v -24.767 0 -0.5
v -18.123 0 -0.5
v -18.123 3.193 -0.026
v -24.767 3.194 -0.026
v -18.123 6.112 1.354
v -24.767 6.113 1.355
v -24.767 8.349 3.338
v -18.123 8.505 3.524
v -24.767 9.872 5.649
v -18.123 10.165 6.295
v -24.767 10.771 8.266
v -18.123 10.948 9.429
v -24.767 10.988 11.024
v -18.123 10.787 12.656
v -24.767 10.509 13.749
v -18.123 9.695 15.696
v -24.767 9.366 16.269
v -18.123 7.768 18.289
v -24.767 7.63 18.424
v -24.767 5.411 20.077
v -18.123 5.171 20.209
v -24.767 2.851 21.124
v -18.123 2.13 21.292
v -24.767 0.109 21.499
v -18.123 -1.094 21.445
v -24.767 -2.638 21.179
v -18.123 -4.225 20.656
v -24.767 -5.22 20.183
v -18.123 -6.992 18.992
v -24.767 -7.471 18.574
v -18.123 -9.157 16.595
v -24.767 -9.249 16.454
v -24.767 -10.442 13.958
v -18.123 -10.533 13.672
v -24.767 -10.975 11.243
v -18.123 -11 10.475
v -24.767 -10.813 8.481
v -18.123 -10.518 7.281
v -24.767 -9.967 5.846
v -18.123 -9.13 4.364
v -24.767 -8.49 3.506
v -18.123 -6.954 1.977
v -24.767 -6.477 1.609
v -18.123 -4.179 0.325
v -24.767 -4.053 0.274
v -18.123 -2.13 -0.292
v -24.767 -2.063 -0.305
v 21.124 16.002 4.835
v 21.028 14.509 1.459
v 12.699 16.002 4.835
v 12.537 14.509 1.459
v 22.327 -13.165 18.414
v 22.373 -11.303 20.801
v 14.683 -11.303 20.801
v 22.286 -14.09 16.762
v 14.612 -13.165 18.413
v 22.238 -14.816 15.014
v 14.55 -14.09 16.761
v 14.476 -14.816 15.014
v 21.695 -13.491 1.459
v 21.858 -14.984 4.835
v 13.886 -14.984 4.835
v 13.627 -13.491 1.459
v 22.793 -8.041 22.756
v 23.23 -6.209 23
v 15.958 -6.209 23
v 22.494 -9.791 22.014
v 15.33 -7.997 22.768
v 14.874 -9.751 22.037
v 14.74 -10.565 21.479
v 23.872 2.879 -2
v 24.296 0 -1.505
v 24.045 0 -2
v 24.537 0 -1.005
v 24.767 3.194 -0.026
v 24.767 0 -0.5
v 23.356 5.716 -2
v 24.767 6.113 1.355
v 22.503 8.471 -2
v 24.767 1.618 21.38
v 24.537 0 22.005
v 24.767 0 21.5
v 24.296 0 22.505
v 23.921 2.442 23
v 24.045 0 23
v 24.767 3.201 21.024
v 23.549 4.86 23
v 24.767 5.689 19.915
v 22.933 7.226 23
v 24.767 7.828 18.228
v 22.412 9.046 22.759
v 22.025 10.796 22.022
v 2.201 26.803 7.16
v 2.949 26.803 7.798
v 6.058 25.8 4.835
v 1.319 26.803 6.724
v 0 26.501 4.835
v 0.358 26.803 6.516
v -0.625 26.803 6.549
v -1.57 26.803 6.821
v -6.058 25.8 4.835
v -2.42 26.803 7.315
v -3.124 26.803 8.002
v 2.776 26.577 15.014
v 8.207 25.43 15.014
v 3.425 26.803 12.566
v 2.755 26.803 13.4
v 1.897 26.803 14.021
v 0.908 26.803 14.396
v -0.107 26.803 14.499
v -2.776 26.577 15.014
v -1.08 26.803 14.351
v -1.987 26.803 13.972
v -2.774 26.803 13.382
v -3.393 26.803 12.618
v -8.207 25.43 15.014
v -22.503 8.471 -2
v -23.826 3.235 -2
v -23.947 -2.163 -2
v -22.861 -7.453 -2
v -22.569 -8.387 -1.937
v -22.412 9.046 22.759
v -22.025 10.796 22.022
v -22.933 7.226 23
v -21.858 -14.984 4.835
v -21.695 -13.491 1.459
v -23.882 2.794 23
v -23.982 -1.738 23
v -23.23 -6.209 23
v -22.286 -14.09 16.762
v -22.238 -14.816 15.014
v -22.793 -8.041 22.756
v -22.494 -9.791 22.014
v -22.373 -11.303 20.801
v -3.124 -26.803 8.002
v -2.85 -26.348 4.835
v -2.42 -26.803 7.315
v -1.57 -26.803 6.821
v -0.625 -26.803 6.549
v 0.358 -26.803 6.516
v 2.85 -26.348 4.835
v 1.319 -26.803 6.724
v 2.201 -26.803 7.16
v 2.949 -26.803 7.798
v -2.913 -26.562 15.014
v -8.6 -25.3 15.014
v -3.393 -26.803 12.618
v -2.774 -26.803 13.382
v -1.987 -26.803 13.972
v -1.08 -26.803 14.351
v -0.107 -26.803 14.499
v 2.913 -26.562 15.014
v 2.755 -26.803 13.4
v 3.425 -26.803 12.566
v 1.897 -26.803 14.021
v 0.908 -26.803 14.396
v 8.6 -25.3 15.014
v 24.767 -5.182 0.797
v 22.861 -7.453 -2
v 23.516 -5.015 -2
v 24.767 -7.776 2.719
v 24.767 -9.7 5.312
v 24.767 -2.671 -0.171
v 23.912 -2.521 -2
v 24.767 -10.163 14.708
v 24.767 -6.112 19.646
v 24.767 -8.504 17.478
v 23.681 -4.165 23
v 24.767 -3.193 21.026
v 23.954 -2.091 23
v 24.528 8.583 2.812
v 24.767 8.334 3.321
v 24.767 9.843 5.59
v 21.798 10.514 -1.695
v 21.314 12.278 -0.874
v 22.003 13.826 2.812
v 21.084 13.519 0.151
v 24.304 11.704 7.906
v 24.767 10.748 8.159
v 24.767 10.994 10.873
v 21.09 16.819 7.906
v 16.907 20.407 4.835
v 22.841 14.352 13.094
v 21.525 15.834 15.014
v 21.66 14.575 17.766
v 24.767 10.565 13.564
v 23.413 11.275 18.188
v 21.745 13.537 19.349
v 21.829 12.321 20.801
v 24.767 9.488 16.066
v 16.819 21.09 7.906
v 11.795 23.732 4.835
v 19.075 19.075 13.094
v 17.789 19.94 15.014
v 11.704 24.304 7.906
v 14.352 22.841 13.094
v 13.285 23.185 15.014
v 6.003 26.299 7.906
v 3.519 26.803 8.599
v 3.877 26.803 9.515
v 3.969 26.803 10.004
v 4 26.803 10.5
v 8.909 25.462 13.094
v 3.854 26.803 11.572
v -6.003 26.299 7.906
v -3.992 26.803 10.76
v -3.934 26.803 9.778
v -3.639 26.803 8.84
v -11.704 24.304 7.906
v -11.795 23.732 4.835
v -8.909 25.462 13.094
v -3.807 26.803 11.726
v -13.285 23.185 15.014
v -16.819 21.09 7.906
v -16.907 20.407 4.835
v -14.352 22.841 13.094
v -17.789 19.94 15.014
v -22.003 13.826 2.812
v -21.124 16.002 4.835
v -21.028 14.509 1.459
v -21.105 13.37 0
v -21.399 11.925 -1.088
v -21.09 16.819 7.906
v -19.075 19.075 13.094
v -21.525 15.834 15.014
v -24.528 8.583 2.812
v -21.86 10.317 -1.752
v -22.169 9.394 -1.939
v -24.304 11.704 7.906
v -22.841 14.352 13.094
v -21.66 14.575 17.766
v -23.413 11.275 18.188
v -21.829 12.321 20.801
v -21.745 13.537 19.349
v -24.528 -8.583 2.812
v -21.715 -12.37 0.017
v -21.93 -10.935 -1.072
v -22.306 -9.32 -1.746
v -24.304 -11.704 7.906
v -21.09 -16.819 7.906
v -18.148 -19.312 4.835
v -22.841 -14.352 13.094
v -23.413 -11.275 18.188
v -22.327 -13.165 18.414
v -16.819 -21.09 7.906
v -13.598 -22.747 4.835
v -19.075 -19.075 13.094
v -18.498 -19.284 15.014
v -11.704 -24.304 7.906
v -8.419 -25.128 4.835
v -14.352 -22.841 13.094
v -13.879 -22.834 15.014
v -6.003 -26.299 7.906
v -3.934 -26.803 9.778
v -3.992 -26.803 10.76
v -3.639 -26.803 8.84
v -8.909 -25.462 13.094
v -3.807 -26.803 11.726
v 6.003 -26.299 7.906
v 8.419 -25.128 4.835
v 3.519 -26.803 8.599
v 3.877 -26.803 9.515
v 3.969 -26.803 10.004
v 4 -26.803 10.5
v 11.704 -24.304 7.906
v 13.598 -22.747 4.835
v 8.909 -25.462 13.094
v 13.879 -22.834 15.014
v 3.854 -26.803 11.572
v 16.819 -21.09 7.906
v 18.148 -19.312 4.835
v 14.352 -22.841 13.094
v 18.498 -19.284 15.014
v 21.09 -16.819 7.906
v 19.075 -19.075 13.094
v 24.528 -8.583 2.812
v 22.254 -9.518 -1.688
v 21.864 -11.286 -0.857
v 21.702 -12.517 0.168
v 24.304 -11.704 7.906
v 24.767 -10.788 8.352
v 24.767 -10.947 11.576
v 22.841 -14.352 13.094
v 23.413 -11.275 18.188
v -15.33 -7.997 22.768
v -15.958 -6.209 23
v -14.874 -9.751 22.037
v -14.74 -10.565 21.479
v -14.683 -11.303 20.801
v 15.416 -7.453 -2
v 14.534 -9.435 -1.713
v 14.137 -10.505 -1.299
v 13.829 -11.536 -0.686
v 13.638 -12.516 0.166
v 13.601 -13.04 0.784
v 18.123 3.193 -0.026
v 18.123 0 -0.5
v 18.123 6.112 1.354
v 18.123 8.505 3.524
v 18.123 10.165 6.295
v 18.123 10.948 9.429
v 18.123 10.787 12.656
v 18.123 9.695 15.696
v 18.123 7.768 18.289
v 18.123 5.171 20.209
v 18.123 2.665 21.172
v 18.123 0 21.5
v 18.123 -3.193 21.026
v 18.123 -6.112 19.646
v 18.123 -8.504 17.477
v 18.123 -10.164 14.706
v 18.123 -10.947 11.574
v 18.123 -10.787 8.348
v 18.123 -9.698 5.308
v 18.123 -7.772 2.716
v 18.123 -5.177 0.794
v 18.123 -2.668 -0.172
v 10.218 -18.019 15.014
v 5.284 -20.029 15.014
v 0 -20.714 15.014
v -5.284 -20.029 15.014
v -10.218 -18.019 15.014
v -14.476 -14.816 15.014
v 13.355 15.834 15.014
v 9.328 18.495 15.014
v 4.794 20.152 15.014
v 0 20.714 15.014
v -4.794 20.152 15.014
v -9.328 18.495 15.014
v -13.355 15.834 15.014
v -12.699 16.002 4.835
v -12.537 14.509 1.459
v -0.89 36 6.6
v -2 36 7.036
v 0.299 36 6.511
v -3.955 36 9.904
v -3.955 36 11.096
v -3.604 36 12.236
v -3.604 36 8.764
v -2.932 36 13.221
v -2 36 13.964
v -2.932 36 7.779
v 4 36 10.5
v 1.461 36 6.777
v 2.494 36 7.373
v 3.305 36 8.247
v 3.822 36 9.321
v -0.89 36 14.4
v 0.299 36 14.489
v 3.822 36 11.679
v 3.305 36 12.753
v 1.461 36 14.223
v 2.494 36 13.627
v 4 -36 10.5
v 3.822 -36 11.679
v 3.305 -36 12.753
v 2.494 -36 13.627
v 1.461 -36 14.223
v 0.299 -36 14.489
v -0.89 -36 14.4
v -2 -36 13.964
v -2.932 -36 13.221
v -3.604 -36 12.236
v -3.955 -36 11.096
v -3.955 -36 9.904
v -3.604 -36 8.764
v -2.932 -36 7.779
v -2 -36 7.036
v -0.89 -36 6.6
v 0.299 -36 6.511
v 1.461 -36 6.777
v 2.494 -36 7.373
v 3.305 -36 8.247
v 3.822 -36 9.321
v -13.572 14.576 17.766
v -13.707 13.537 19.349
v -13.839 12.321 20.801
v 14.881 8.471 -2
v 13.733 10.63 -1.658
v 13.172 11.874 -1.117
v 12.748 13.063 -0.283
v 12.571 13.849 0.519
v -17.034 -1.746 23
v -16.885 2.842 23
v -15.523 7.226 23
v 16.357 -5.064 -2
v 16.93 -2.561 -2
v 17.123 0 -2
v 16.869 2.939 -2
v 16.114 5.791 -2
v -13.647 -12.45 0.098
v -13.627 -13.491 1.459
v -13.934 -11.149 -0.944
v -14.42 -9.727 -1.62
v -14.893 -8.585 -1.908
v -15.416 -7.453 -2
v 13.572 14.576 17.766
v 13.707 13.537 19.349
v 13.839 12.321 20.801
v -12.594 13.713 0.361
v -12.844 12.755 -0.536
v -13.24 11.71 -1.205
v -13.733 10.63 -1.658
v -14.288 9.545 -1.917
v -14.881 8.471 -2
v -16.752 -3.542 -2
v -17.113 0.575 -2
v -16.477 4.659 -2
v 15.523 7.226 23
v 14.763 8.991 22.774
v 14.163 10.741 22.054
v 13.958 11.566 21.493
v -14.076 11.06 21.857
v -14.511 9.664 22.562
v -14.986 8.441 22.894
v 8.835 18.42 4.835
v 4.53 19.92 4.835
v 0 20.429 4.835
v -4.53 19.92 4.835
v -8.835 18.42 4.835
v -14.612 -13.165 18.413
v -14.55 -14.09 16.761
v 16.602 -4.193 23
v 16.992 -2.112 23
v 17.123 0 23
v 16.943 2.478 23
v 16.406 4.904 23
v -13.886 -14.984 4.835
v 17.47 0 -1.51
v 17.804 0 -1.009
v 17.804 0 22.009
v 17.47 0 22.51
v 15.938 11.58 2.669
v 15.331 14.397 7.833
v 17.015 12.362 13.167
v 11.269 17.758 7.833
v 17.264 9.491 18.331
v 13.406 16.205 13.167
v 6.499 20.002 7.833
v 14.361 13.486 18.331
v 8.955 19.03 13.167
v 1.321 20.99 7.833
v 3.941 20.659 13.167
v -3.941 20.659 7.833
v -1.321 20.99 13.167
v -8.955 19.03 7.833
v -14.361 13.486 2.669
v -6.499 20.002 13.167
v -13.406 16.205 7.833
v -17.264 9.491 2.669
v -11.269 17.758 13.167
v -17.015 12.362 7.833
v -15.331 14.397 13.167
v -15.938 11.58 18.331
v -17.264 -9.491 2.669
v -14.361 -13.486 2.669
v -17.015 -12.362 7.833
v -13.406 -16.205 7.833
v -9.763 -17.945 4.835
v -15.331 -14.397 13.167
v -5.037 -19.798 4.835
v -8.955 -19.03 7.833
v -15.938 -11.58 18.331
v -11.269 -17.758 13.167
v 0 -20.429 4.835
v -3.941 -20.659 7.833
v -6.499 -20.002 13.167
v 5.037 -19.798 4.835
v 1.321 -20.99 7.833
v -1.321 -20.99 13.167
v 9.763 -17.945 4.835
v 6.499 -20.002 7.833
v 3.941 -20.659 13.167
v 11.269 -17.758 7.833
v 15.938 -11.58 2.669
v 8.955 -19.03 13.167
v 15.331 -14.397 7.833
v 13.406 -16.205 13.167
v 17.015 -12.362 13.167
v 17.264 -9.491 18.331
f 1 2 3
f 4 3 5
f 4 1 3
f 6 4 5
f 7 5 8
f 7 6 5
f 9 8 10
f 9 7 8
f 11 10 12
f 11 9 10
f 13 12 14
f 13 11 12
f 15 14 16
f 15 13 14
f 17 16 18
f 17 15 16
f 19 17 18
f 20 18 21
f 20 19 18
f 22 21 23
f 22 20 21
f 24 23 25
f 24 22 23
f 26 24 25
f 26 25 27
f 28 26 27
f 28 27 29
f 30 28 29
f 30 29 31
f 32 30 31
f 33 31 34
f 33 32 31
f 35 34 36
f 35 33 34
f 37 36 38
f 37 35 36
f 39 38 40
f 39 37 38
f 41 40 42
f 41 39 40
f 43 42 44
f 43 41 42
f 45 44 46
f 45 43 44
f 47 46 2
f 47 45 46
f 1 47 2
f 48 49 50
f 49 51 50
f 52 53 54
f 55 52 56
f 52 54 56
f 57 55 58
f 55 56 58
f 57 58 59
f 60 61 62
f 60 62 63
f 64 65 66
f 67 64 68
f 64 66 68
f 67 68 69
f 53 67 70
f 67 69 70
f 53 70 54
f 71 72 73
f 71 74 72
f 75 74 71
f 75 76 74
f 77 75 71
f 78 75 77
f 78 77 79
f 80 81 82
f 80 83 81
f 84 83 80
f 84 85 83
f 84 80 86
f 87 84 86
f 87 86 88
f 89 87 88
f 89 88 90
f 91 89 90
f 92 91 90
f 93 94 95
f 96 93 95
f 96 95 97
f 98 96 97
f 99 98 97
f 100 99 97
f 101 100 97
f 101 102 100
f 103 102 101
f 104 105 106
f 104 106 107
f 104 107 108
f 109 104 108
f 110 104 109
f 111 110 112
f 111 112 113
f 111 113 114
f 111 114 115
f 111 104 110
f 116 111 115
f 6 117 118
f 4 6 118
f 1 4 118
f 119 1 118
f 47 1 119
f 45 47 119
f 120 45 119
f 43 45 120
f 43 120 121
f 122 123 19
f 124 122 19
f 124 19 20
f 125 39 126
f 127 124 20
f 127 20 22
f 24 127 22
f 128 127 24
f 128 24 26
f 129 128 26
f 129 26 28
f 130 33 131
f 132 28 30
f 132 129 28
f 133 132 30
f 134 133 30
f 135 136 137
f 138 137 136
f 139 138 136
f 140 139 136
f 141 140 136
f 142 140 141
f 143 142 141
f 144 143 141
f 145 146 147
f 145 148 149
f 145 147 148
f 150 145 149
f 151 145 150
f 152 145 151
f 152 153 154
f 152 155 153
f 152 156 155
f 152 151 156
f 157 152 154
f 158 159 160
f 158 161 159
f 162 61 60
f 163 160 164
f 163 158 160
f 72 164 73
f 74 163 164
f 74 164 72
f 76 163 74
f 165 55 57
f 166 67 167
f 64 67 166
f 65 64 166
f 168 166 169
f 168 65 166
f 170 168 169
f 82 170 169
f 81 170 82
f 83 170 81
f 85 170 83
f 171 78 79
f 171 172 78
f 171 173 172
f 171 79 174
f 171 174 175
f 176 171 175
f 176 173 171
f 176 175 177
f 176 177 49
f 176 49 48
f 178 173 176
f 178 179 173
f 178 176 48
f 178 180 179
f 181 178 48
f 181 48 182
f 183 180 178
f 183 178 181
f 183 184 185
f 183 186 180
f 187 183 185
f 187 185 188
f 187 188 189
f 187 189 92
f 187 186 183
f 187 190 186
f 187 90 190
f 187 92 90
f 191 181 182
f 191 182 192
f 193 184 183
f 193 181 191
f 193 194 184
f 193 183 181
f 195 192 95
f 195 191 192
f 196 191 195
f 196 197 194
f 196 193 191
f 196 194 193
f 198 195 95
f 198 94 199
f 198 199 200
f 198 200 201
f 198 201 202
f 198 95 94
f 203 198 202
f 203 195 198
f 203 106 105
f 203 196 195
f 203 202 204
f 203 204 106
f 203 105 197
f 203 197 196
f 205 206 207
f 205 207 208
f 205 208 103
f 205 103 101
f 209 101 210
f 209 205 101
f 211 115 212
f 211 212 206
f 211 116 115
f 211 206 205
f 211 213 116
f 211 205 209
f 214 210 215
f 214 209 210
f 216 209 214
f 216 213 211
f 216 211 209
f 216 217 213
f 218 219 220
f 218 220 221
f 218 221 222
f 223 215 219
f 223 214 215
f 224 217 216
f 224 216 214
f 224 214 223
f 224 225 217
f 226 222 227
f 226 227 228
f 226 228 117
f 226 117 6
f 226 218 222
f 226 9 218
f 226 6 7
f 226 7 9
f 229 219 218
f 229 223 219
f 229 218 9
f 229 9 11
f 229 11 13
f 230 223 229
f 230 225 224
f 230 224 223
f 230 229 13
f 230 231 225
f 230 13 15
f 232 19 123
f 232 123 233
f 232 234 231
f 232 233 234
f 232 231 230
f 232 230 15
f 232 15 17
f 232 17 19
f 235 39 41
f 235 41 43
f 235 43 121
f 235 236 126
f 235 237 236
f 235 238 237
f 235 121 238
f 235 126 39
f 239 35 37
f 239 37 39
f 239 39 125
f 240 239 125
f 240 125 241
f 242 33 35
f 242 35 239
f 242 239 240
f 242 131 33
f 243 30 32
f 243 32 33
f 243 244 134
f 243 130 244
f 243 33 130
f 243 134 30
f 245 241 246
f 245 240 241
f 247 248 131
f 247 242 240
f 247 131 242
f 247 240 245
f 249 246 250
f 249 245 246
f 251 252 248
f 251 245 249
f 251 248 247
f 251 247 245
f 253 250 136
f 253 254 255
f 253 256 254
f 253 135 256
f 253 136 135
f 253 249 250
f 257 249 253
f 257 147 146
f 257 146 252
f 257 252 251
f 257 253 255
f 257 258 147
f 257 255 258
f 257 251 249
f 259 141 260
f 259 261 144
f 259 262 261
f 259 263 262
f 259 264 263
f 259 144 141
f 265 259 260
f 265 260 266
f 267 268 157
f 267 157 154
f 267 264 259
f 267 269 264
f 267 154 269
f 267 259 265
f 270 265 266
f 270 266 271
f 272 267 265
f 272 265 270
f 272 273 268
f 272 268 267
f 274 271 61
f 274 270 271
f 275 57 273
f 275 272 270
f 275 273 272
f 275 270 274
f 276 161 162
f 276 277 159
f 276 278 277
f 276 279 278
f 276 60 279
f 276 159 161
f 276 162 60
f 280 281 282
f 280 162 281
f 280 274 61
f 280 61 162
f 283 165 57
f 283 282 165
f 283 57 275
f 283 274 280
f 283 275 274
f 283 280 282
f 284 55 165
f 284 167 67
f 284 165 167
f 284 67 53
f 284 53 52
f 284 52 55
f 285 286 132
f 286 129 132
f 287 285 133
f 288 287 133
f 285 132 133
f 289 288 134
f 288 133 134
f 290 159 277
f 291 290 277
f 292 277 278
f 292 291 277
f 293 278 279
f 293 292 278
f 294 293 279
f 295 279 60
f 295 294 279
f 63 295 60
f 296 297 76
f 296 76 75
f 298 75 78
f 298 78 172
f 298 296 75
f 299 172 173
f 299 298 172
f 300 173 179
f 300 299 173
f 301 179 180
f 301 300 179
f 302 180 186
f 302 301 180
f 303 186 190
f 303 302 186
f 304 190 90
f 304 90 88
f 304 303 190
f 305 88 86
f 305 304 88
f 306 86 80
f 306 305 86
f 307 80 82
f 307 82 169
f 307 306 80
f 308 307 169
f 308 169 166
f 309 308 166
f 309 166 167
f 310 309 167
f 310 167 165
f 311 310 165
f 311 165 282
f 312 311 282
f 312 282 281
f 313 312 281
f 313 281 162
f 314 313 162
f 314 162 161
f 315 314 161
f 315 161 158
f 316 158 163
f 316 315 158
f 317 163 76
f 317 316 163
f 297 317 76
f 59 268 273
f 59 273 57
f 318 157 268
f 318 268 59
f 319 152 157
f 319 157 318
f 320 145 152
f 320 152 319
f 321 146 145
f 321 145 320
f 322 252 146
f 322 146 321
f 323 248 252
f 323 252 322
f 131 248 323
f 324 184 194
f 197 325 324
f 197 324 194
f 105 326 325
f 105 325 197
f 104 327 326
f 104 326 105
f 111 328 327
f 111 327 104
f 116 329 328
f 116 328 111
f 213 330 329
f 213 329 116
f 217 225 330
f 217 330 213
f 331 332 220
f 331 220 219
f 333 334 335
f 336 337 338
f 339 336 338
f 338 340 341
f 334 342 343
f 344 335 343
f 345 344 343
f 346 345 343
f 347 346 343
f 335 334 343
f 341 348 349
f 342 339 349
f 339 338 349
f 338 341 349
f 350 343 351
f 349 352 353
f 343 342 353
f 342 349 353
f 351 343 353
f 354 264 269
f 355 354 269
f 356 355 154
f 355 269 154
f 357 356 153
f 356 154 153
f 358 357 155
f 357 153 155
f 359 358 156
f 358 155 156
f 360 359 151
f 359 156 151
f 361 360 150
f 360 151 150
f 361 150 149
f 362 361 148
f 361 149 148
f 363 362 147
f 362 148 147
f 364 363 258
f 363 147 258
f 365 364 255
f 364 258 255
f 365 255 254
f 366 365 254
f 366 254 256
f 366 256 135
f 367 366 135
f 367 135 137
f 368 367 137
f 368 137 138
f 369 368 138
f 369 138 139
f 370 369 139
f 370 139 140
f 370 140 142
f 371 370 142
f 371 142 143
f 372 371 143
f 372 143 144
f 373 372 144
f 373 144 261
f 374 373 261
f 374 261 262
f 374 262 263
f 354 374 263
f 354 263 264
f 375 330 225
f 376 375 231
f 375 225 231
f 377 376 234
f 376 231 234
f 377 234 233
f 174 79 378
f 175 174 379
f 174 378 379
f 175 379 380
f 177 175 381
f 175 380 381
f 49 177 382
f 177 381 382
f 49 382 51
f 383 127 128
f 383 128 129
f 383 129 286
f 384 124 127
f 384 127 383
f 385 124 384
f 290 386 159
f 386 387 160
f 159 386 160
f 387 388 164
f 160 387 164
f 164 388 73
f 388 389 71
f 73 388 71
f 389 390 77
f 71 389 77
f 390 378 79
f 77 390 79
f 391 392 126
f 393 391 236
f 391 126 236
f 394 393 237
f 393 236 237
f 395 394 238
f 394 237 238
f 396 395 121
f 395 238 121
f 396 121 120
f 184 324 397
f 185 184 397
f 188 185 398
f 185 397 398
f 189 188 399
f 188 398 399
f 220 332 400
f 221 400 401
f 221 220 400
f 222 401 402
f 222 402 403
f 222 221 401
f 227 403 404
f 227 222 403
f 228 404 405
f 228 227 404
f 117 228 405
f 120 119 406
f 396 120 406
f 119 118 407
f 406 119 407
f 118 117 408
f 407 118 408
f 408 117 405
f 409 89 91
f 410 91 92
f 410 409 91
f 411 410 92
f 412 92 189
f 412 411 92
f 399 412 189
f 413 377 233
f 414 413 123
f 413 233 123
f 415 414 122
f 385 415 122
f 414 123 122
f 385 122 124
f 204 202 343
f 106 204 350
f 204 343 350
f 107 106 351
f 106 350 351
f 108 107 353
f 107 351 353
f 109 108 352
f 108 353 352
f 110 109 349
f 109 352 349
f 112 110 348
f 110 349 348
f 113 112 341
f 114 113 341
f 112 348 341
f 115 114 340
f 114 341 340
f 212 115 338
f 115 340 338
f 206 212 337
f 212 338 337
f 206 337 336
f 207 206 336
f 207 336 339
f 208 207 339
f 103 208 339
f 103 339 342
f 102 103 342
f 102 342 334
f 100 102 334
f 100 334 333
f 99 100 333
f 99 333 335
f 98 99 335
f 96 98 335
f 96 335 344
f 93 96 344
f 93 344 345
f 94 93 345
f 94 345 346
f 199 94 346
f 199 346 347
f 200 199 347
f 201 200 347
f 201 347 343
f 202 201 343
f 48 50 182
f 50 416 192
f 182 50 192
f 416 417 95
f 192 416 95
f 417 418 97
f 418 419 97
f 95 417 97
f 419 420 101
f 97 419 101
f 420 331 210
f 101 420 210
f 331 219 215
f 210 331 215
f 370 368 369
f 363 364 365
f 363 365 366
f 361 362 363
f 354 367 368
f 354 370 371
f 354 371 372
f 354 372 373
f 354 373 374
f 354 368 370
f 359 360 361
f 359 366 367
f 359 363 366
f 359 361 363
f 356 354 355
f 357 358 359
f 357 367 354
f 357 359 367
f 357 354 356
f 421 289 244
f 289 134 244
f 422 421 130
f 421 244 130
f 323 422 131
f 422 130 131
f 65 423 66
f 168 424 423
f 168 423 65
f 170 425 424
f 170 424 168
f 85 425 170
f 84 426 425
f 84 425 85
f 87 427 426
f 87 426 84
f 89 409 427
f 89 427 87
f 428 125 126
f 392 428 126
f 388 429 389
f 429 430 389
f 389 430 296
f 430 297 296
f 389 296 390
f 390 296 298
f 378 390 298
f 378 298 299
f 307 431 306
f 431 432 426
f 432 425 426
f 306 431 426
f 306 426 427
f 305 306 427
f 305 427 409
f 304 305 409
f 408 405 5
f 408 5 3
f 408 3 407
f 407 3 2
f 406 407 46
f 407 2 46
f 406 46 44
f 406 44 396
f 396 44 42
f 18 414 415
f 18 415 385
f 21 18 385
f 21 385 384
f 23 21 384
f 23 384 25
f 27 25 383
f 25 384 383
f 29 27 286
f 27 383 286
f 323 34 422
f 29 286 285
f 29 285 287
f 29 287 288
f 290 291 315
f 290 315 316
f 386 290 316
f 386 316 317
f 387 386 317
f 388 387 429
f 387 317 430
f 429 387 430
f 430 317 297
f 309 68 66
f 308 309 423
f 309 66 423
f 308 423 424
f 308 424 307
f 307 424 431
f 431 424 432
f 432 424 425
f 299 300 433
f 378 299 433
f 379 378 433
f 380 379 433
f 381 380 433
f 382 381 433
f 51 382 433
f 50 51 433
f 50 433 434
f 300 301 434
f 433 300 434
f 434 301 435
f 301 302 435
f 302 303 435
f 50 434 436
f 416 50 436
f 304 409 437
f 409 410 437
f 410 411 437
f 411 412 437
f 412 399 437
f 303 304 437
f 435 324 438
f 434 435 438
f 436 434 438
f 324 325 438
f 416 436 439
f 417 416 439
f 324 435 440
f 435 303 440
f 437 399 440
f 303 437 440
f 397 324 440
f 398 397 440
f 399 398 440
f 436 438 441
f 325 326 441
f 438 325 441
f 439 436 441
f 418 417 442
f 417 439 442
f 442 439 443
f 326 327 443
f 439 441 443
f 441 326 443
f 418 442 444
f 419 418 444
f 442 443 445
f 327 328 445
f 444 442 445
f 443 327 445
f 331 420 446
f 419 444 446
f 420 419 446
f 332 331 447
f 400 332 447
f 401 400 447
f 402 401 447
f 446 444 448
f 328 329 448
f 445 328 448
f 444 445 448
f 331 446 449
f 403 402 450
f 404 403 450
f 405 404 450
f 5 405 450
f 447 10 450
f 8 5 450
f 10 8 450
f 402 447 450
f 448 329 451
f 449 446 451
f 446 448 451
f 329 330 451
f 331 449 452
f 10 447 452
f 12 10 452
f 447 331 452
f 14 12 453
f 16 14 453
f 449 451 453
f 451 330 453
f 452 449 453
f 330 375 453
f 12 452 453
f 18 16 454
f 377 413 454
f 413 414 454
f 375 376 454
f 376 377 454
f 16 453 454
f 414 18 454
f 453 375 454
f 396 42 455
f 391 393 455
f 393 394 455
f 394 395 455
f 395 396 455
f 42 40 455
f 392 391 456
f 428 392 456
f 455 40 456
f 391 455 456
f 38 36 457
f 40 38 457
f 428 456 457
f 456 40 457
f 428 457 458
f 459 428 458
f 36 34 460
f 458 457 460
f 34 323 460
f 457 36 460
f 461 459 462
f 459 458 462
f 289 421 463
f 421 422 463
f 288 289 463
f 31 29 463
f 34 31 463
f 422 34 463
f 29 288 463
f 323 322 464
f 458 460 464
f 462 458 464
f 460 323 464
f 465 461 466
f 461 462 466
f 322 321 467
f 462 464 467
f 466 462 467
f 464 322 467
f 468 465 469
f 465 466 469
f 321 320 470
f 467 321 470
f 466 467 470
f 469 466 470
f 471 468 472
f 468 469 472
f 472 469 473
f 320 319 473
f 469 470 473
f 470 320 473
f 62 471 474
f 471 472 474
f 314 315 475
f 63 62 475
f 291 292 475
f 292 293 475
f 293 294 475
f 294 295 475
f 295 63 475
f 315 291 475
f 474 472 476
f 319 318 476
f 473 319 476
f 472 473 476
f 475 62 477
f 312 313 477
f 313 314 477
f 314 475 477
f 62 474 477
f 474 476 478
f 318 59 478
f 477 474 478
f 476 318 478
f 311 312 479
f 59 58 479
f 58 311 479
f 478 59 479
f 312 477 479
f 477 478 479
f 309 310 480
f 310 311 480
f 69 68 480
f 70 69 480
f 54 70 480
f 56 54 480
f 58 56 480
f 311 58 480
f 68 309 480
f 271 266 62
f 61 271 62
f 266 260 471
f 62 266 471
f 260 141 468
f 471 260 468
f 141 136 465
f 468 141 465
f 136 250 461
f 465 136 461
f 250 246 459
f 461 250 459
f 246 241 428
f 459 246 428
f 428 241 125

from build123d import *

# Parameters (mm, degrees)
BOX003_W                = 300
BOX003_H                = 300
BOX003_DEPTH            = 100
BOX002_W                = 300
BOX002_H                = 300
BOX002_DEPTH            = 100
CYLINDER006_R           = 11
CYLINDER006_DEPTH       = 68
CYLINDER006_PITCH_ANGLE = 90
CYLINDER007_R           = 4
CYLINDER007_DEPTH       = 72
CYLINDER007_ROLL_ANGLE  = 90
SKETCH003_R             = 16.230199
PAD002_DEPTH            = 60
SKETCH002_W             = 75.068111
SKETCH002_H             = 10.178723
PAD003_DEPTH            = 60
FILLET_R                = 7
FILLET001_R             = 7
FILLET002_R             = 7


with BuildPart() as cube003:
    # Box003 → Box003 (new body)
    with BuildSketch(Plane(origin=(-150, -150, 23), x_dir=(1, 0, 0), z_dir=(0, 0, 1))):
        with Locations((150, 150)):
            Rectangle(BOX003_W, BOX003_H)
    extrude(amount=BOX003_DEPTH)


with BuildPart() as fusion002:
    # Box002 → Box002 (new body)
    with BuildSketch(Plane(origin=(-150, -150, -102), x_dir=(1, 0, 0), z_dir=(0, 0, 1))):
        with Locations((150, 150)):
            Rectangle(BOX002_W, BOX002_H)
    extrude(amount=BOX002_DEPTH)

    # Fusion002: union Cube003
    add(cube003.part)


with BuildPart() as cylindre005:
    # Cylinder006 → Cylinder006 (new body)
    with BuildSketch(Plane.XY):
        Circle(CYLINDER006_R)
    extrude(amount=CYLINDER006_DEPTH)


with BuildPart() as cylindre005_1:
    # Cylinder006 pitch: moved
    add(cylindre005.part.rotate(Axis((0, 0, 0), (0, 1, 0)), CYLINDER006_PITCH_ANGLE))


with BuildPart() as cylindre005_2:
    # Cylinder006 placement: moved
    add(cylindre005_1.part.moved(Location((-32, 0, 10.5))))


with BuildPart() as sph_re001:
    # Sphere001 → Sphere001 (revolve)
    with BuildSketch(Plane(origin=(0, 0, 10.5), x_dir=(1, 0, 0), z_dir=(0, -1, 0))):
        with BuildLine():
            ThreePointArc((0, -21.2), (21.2, 0), (0, 21.2))
            Line((0, 21.2), (0, -21.2))
        make_face()
    revolve(axis=Axis((0, 0, 10.5), (0, 0, 1)))


with BuildPart() as cut008:
    # Sphere002 → Sphere002 (revolve)
    with BuildSketch(Plane(origin=(0, 0, 10.5), x_dir=(1, 0, 0), z_dir=(0, -1, 0))):
        with BuildLine():
            ThreePointArc((0, -27.1), (27.1, 0), (0, 27.1))
            Line((0, 27.1), (0, -27.1))
        make_face()
    revolve(axis=Axis((0, 0, 10.5), (0, 0, 1)))

    # Cut006: cut Sphère001
    add(sph_re001.part, mode=Mode.SUBTRACT)

    # Cut007: cut Cylindre005
    add(cylindre005_2.part, mode=Mode.SUBTRACT)

    # Cut008: cut Fusion002
    add(fusion002.part, mode=Mode.SUBTRACT)


with BuildPart() as sph_re003:
    # Sphere003 → Sphere003 (revolve)
    with BuildSketch(Plane(origin=(0, 0, 10.5), x_dir=(1, 0, 0), z_dir=(0, -1, 0))):
        with BuildLine():
            ThreePointArc((0, -21.4), (21.4, 0), (0, 21.4))
            Line((0, 21.4), (0, -21.4))
        make_face()
    revolve(axis=Axis((0, 0, 10.5), (0, 0, 1)))


with BuildPart() as mediium:
    # Cylinder007 → Cylinder007 (new body)
    with BuildSketch(Plane.XY):
        Circle(CYLINDER007_R)
    extrude(amount=CYLINDER007_DEPTH)


with BuildPart() as mediium_1:
    # Cylinder007 roll: moved
    add(mediium.part.rotate(Axis((0, 0, 0), (1, 0, 0)), CYLINDER007_ROLL_ANGLE))


with BuildPart() as mediium_2:
    # Cylinder007 placement: moved
    add(mediium_1.part.moved(Location((0, 36, 10.5))))

    # Cut009: cut Sphère003
    add(sph_re003.part, mode=Mode.SUBTRACT)

    # Fusion003: union Cut008
    add(cut008.part)


with BuildPart() as pad002:
    # Sketch003 → Pad002 (new body)
    with BuildSketch(Plane.YZ.offset(-25)):
        with Locations((0.508931, 9.669792)):
            Circle(SKETCH003_R)
    extrude(amount=PAD002_DEPTH)


with BuildPart() as medium2:
    # Sketch002 → Pad003 (new body)
    with BuildSketch(Plane.YZ.offset(-25)):
        with Locations((0.127233, 9.924257)):
            Rectangle(SKETCH002_W, SKETCH002_H)
    extrude(amount=PAD003_DEPTH)

    # Fusion007: union Pad002
    add(pad002.part)

    # Common002: intersect mediium
    add(mediium_2.part, mode=Mode.INTERSECT)

    # Fillet
    fillet_edges = [medium2.edges().sort_by_distance(p)[0] for p in [
        (18.017556, 9.767706, 23),
        (-18.017556, 9.767706, 23),
    ]]
    fillet(fillet_edges, radius=FILLET_R)

    # Fillet001
    fillet001_edges = [medium2.edges().sort_by_distance(p)[0] for p in [
        (-18.557399, -8.749844, 23),
        (18.557399, -8.749844, 23),
    ]]
    fillet(fillet001_edges, radius=FILLET001_R)

    # Fillet002
    fillet002_edges = [medium2.edges().sort_by_distance(p)[0] for p in [
        (-17.404195, -10.770932, -2),
        (17.404195, -10.770932, -2),
        (16.687516, 11.788794, -2),
        (-16.687516, 11.788794, -2),
    ]]
    fillet(fillet002_edges, radius=FILLET002_R)


solid = medium2.part
